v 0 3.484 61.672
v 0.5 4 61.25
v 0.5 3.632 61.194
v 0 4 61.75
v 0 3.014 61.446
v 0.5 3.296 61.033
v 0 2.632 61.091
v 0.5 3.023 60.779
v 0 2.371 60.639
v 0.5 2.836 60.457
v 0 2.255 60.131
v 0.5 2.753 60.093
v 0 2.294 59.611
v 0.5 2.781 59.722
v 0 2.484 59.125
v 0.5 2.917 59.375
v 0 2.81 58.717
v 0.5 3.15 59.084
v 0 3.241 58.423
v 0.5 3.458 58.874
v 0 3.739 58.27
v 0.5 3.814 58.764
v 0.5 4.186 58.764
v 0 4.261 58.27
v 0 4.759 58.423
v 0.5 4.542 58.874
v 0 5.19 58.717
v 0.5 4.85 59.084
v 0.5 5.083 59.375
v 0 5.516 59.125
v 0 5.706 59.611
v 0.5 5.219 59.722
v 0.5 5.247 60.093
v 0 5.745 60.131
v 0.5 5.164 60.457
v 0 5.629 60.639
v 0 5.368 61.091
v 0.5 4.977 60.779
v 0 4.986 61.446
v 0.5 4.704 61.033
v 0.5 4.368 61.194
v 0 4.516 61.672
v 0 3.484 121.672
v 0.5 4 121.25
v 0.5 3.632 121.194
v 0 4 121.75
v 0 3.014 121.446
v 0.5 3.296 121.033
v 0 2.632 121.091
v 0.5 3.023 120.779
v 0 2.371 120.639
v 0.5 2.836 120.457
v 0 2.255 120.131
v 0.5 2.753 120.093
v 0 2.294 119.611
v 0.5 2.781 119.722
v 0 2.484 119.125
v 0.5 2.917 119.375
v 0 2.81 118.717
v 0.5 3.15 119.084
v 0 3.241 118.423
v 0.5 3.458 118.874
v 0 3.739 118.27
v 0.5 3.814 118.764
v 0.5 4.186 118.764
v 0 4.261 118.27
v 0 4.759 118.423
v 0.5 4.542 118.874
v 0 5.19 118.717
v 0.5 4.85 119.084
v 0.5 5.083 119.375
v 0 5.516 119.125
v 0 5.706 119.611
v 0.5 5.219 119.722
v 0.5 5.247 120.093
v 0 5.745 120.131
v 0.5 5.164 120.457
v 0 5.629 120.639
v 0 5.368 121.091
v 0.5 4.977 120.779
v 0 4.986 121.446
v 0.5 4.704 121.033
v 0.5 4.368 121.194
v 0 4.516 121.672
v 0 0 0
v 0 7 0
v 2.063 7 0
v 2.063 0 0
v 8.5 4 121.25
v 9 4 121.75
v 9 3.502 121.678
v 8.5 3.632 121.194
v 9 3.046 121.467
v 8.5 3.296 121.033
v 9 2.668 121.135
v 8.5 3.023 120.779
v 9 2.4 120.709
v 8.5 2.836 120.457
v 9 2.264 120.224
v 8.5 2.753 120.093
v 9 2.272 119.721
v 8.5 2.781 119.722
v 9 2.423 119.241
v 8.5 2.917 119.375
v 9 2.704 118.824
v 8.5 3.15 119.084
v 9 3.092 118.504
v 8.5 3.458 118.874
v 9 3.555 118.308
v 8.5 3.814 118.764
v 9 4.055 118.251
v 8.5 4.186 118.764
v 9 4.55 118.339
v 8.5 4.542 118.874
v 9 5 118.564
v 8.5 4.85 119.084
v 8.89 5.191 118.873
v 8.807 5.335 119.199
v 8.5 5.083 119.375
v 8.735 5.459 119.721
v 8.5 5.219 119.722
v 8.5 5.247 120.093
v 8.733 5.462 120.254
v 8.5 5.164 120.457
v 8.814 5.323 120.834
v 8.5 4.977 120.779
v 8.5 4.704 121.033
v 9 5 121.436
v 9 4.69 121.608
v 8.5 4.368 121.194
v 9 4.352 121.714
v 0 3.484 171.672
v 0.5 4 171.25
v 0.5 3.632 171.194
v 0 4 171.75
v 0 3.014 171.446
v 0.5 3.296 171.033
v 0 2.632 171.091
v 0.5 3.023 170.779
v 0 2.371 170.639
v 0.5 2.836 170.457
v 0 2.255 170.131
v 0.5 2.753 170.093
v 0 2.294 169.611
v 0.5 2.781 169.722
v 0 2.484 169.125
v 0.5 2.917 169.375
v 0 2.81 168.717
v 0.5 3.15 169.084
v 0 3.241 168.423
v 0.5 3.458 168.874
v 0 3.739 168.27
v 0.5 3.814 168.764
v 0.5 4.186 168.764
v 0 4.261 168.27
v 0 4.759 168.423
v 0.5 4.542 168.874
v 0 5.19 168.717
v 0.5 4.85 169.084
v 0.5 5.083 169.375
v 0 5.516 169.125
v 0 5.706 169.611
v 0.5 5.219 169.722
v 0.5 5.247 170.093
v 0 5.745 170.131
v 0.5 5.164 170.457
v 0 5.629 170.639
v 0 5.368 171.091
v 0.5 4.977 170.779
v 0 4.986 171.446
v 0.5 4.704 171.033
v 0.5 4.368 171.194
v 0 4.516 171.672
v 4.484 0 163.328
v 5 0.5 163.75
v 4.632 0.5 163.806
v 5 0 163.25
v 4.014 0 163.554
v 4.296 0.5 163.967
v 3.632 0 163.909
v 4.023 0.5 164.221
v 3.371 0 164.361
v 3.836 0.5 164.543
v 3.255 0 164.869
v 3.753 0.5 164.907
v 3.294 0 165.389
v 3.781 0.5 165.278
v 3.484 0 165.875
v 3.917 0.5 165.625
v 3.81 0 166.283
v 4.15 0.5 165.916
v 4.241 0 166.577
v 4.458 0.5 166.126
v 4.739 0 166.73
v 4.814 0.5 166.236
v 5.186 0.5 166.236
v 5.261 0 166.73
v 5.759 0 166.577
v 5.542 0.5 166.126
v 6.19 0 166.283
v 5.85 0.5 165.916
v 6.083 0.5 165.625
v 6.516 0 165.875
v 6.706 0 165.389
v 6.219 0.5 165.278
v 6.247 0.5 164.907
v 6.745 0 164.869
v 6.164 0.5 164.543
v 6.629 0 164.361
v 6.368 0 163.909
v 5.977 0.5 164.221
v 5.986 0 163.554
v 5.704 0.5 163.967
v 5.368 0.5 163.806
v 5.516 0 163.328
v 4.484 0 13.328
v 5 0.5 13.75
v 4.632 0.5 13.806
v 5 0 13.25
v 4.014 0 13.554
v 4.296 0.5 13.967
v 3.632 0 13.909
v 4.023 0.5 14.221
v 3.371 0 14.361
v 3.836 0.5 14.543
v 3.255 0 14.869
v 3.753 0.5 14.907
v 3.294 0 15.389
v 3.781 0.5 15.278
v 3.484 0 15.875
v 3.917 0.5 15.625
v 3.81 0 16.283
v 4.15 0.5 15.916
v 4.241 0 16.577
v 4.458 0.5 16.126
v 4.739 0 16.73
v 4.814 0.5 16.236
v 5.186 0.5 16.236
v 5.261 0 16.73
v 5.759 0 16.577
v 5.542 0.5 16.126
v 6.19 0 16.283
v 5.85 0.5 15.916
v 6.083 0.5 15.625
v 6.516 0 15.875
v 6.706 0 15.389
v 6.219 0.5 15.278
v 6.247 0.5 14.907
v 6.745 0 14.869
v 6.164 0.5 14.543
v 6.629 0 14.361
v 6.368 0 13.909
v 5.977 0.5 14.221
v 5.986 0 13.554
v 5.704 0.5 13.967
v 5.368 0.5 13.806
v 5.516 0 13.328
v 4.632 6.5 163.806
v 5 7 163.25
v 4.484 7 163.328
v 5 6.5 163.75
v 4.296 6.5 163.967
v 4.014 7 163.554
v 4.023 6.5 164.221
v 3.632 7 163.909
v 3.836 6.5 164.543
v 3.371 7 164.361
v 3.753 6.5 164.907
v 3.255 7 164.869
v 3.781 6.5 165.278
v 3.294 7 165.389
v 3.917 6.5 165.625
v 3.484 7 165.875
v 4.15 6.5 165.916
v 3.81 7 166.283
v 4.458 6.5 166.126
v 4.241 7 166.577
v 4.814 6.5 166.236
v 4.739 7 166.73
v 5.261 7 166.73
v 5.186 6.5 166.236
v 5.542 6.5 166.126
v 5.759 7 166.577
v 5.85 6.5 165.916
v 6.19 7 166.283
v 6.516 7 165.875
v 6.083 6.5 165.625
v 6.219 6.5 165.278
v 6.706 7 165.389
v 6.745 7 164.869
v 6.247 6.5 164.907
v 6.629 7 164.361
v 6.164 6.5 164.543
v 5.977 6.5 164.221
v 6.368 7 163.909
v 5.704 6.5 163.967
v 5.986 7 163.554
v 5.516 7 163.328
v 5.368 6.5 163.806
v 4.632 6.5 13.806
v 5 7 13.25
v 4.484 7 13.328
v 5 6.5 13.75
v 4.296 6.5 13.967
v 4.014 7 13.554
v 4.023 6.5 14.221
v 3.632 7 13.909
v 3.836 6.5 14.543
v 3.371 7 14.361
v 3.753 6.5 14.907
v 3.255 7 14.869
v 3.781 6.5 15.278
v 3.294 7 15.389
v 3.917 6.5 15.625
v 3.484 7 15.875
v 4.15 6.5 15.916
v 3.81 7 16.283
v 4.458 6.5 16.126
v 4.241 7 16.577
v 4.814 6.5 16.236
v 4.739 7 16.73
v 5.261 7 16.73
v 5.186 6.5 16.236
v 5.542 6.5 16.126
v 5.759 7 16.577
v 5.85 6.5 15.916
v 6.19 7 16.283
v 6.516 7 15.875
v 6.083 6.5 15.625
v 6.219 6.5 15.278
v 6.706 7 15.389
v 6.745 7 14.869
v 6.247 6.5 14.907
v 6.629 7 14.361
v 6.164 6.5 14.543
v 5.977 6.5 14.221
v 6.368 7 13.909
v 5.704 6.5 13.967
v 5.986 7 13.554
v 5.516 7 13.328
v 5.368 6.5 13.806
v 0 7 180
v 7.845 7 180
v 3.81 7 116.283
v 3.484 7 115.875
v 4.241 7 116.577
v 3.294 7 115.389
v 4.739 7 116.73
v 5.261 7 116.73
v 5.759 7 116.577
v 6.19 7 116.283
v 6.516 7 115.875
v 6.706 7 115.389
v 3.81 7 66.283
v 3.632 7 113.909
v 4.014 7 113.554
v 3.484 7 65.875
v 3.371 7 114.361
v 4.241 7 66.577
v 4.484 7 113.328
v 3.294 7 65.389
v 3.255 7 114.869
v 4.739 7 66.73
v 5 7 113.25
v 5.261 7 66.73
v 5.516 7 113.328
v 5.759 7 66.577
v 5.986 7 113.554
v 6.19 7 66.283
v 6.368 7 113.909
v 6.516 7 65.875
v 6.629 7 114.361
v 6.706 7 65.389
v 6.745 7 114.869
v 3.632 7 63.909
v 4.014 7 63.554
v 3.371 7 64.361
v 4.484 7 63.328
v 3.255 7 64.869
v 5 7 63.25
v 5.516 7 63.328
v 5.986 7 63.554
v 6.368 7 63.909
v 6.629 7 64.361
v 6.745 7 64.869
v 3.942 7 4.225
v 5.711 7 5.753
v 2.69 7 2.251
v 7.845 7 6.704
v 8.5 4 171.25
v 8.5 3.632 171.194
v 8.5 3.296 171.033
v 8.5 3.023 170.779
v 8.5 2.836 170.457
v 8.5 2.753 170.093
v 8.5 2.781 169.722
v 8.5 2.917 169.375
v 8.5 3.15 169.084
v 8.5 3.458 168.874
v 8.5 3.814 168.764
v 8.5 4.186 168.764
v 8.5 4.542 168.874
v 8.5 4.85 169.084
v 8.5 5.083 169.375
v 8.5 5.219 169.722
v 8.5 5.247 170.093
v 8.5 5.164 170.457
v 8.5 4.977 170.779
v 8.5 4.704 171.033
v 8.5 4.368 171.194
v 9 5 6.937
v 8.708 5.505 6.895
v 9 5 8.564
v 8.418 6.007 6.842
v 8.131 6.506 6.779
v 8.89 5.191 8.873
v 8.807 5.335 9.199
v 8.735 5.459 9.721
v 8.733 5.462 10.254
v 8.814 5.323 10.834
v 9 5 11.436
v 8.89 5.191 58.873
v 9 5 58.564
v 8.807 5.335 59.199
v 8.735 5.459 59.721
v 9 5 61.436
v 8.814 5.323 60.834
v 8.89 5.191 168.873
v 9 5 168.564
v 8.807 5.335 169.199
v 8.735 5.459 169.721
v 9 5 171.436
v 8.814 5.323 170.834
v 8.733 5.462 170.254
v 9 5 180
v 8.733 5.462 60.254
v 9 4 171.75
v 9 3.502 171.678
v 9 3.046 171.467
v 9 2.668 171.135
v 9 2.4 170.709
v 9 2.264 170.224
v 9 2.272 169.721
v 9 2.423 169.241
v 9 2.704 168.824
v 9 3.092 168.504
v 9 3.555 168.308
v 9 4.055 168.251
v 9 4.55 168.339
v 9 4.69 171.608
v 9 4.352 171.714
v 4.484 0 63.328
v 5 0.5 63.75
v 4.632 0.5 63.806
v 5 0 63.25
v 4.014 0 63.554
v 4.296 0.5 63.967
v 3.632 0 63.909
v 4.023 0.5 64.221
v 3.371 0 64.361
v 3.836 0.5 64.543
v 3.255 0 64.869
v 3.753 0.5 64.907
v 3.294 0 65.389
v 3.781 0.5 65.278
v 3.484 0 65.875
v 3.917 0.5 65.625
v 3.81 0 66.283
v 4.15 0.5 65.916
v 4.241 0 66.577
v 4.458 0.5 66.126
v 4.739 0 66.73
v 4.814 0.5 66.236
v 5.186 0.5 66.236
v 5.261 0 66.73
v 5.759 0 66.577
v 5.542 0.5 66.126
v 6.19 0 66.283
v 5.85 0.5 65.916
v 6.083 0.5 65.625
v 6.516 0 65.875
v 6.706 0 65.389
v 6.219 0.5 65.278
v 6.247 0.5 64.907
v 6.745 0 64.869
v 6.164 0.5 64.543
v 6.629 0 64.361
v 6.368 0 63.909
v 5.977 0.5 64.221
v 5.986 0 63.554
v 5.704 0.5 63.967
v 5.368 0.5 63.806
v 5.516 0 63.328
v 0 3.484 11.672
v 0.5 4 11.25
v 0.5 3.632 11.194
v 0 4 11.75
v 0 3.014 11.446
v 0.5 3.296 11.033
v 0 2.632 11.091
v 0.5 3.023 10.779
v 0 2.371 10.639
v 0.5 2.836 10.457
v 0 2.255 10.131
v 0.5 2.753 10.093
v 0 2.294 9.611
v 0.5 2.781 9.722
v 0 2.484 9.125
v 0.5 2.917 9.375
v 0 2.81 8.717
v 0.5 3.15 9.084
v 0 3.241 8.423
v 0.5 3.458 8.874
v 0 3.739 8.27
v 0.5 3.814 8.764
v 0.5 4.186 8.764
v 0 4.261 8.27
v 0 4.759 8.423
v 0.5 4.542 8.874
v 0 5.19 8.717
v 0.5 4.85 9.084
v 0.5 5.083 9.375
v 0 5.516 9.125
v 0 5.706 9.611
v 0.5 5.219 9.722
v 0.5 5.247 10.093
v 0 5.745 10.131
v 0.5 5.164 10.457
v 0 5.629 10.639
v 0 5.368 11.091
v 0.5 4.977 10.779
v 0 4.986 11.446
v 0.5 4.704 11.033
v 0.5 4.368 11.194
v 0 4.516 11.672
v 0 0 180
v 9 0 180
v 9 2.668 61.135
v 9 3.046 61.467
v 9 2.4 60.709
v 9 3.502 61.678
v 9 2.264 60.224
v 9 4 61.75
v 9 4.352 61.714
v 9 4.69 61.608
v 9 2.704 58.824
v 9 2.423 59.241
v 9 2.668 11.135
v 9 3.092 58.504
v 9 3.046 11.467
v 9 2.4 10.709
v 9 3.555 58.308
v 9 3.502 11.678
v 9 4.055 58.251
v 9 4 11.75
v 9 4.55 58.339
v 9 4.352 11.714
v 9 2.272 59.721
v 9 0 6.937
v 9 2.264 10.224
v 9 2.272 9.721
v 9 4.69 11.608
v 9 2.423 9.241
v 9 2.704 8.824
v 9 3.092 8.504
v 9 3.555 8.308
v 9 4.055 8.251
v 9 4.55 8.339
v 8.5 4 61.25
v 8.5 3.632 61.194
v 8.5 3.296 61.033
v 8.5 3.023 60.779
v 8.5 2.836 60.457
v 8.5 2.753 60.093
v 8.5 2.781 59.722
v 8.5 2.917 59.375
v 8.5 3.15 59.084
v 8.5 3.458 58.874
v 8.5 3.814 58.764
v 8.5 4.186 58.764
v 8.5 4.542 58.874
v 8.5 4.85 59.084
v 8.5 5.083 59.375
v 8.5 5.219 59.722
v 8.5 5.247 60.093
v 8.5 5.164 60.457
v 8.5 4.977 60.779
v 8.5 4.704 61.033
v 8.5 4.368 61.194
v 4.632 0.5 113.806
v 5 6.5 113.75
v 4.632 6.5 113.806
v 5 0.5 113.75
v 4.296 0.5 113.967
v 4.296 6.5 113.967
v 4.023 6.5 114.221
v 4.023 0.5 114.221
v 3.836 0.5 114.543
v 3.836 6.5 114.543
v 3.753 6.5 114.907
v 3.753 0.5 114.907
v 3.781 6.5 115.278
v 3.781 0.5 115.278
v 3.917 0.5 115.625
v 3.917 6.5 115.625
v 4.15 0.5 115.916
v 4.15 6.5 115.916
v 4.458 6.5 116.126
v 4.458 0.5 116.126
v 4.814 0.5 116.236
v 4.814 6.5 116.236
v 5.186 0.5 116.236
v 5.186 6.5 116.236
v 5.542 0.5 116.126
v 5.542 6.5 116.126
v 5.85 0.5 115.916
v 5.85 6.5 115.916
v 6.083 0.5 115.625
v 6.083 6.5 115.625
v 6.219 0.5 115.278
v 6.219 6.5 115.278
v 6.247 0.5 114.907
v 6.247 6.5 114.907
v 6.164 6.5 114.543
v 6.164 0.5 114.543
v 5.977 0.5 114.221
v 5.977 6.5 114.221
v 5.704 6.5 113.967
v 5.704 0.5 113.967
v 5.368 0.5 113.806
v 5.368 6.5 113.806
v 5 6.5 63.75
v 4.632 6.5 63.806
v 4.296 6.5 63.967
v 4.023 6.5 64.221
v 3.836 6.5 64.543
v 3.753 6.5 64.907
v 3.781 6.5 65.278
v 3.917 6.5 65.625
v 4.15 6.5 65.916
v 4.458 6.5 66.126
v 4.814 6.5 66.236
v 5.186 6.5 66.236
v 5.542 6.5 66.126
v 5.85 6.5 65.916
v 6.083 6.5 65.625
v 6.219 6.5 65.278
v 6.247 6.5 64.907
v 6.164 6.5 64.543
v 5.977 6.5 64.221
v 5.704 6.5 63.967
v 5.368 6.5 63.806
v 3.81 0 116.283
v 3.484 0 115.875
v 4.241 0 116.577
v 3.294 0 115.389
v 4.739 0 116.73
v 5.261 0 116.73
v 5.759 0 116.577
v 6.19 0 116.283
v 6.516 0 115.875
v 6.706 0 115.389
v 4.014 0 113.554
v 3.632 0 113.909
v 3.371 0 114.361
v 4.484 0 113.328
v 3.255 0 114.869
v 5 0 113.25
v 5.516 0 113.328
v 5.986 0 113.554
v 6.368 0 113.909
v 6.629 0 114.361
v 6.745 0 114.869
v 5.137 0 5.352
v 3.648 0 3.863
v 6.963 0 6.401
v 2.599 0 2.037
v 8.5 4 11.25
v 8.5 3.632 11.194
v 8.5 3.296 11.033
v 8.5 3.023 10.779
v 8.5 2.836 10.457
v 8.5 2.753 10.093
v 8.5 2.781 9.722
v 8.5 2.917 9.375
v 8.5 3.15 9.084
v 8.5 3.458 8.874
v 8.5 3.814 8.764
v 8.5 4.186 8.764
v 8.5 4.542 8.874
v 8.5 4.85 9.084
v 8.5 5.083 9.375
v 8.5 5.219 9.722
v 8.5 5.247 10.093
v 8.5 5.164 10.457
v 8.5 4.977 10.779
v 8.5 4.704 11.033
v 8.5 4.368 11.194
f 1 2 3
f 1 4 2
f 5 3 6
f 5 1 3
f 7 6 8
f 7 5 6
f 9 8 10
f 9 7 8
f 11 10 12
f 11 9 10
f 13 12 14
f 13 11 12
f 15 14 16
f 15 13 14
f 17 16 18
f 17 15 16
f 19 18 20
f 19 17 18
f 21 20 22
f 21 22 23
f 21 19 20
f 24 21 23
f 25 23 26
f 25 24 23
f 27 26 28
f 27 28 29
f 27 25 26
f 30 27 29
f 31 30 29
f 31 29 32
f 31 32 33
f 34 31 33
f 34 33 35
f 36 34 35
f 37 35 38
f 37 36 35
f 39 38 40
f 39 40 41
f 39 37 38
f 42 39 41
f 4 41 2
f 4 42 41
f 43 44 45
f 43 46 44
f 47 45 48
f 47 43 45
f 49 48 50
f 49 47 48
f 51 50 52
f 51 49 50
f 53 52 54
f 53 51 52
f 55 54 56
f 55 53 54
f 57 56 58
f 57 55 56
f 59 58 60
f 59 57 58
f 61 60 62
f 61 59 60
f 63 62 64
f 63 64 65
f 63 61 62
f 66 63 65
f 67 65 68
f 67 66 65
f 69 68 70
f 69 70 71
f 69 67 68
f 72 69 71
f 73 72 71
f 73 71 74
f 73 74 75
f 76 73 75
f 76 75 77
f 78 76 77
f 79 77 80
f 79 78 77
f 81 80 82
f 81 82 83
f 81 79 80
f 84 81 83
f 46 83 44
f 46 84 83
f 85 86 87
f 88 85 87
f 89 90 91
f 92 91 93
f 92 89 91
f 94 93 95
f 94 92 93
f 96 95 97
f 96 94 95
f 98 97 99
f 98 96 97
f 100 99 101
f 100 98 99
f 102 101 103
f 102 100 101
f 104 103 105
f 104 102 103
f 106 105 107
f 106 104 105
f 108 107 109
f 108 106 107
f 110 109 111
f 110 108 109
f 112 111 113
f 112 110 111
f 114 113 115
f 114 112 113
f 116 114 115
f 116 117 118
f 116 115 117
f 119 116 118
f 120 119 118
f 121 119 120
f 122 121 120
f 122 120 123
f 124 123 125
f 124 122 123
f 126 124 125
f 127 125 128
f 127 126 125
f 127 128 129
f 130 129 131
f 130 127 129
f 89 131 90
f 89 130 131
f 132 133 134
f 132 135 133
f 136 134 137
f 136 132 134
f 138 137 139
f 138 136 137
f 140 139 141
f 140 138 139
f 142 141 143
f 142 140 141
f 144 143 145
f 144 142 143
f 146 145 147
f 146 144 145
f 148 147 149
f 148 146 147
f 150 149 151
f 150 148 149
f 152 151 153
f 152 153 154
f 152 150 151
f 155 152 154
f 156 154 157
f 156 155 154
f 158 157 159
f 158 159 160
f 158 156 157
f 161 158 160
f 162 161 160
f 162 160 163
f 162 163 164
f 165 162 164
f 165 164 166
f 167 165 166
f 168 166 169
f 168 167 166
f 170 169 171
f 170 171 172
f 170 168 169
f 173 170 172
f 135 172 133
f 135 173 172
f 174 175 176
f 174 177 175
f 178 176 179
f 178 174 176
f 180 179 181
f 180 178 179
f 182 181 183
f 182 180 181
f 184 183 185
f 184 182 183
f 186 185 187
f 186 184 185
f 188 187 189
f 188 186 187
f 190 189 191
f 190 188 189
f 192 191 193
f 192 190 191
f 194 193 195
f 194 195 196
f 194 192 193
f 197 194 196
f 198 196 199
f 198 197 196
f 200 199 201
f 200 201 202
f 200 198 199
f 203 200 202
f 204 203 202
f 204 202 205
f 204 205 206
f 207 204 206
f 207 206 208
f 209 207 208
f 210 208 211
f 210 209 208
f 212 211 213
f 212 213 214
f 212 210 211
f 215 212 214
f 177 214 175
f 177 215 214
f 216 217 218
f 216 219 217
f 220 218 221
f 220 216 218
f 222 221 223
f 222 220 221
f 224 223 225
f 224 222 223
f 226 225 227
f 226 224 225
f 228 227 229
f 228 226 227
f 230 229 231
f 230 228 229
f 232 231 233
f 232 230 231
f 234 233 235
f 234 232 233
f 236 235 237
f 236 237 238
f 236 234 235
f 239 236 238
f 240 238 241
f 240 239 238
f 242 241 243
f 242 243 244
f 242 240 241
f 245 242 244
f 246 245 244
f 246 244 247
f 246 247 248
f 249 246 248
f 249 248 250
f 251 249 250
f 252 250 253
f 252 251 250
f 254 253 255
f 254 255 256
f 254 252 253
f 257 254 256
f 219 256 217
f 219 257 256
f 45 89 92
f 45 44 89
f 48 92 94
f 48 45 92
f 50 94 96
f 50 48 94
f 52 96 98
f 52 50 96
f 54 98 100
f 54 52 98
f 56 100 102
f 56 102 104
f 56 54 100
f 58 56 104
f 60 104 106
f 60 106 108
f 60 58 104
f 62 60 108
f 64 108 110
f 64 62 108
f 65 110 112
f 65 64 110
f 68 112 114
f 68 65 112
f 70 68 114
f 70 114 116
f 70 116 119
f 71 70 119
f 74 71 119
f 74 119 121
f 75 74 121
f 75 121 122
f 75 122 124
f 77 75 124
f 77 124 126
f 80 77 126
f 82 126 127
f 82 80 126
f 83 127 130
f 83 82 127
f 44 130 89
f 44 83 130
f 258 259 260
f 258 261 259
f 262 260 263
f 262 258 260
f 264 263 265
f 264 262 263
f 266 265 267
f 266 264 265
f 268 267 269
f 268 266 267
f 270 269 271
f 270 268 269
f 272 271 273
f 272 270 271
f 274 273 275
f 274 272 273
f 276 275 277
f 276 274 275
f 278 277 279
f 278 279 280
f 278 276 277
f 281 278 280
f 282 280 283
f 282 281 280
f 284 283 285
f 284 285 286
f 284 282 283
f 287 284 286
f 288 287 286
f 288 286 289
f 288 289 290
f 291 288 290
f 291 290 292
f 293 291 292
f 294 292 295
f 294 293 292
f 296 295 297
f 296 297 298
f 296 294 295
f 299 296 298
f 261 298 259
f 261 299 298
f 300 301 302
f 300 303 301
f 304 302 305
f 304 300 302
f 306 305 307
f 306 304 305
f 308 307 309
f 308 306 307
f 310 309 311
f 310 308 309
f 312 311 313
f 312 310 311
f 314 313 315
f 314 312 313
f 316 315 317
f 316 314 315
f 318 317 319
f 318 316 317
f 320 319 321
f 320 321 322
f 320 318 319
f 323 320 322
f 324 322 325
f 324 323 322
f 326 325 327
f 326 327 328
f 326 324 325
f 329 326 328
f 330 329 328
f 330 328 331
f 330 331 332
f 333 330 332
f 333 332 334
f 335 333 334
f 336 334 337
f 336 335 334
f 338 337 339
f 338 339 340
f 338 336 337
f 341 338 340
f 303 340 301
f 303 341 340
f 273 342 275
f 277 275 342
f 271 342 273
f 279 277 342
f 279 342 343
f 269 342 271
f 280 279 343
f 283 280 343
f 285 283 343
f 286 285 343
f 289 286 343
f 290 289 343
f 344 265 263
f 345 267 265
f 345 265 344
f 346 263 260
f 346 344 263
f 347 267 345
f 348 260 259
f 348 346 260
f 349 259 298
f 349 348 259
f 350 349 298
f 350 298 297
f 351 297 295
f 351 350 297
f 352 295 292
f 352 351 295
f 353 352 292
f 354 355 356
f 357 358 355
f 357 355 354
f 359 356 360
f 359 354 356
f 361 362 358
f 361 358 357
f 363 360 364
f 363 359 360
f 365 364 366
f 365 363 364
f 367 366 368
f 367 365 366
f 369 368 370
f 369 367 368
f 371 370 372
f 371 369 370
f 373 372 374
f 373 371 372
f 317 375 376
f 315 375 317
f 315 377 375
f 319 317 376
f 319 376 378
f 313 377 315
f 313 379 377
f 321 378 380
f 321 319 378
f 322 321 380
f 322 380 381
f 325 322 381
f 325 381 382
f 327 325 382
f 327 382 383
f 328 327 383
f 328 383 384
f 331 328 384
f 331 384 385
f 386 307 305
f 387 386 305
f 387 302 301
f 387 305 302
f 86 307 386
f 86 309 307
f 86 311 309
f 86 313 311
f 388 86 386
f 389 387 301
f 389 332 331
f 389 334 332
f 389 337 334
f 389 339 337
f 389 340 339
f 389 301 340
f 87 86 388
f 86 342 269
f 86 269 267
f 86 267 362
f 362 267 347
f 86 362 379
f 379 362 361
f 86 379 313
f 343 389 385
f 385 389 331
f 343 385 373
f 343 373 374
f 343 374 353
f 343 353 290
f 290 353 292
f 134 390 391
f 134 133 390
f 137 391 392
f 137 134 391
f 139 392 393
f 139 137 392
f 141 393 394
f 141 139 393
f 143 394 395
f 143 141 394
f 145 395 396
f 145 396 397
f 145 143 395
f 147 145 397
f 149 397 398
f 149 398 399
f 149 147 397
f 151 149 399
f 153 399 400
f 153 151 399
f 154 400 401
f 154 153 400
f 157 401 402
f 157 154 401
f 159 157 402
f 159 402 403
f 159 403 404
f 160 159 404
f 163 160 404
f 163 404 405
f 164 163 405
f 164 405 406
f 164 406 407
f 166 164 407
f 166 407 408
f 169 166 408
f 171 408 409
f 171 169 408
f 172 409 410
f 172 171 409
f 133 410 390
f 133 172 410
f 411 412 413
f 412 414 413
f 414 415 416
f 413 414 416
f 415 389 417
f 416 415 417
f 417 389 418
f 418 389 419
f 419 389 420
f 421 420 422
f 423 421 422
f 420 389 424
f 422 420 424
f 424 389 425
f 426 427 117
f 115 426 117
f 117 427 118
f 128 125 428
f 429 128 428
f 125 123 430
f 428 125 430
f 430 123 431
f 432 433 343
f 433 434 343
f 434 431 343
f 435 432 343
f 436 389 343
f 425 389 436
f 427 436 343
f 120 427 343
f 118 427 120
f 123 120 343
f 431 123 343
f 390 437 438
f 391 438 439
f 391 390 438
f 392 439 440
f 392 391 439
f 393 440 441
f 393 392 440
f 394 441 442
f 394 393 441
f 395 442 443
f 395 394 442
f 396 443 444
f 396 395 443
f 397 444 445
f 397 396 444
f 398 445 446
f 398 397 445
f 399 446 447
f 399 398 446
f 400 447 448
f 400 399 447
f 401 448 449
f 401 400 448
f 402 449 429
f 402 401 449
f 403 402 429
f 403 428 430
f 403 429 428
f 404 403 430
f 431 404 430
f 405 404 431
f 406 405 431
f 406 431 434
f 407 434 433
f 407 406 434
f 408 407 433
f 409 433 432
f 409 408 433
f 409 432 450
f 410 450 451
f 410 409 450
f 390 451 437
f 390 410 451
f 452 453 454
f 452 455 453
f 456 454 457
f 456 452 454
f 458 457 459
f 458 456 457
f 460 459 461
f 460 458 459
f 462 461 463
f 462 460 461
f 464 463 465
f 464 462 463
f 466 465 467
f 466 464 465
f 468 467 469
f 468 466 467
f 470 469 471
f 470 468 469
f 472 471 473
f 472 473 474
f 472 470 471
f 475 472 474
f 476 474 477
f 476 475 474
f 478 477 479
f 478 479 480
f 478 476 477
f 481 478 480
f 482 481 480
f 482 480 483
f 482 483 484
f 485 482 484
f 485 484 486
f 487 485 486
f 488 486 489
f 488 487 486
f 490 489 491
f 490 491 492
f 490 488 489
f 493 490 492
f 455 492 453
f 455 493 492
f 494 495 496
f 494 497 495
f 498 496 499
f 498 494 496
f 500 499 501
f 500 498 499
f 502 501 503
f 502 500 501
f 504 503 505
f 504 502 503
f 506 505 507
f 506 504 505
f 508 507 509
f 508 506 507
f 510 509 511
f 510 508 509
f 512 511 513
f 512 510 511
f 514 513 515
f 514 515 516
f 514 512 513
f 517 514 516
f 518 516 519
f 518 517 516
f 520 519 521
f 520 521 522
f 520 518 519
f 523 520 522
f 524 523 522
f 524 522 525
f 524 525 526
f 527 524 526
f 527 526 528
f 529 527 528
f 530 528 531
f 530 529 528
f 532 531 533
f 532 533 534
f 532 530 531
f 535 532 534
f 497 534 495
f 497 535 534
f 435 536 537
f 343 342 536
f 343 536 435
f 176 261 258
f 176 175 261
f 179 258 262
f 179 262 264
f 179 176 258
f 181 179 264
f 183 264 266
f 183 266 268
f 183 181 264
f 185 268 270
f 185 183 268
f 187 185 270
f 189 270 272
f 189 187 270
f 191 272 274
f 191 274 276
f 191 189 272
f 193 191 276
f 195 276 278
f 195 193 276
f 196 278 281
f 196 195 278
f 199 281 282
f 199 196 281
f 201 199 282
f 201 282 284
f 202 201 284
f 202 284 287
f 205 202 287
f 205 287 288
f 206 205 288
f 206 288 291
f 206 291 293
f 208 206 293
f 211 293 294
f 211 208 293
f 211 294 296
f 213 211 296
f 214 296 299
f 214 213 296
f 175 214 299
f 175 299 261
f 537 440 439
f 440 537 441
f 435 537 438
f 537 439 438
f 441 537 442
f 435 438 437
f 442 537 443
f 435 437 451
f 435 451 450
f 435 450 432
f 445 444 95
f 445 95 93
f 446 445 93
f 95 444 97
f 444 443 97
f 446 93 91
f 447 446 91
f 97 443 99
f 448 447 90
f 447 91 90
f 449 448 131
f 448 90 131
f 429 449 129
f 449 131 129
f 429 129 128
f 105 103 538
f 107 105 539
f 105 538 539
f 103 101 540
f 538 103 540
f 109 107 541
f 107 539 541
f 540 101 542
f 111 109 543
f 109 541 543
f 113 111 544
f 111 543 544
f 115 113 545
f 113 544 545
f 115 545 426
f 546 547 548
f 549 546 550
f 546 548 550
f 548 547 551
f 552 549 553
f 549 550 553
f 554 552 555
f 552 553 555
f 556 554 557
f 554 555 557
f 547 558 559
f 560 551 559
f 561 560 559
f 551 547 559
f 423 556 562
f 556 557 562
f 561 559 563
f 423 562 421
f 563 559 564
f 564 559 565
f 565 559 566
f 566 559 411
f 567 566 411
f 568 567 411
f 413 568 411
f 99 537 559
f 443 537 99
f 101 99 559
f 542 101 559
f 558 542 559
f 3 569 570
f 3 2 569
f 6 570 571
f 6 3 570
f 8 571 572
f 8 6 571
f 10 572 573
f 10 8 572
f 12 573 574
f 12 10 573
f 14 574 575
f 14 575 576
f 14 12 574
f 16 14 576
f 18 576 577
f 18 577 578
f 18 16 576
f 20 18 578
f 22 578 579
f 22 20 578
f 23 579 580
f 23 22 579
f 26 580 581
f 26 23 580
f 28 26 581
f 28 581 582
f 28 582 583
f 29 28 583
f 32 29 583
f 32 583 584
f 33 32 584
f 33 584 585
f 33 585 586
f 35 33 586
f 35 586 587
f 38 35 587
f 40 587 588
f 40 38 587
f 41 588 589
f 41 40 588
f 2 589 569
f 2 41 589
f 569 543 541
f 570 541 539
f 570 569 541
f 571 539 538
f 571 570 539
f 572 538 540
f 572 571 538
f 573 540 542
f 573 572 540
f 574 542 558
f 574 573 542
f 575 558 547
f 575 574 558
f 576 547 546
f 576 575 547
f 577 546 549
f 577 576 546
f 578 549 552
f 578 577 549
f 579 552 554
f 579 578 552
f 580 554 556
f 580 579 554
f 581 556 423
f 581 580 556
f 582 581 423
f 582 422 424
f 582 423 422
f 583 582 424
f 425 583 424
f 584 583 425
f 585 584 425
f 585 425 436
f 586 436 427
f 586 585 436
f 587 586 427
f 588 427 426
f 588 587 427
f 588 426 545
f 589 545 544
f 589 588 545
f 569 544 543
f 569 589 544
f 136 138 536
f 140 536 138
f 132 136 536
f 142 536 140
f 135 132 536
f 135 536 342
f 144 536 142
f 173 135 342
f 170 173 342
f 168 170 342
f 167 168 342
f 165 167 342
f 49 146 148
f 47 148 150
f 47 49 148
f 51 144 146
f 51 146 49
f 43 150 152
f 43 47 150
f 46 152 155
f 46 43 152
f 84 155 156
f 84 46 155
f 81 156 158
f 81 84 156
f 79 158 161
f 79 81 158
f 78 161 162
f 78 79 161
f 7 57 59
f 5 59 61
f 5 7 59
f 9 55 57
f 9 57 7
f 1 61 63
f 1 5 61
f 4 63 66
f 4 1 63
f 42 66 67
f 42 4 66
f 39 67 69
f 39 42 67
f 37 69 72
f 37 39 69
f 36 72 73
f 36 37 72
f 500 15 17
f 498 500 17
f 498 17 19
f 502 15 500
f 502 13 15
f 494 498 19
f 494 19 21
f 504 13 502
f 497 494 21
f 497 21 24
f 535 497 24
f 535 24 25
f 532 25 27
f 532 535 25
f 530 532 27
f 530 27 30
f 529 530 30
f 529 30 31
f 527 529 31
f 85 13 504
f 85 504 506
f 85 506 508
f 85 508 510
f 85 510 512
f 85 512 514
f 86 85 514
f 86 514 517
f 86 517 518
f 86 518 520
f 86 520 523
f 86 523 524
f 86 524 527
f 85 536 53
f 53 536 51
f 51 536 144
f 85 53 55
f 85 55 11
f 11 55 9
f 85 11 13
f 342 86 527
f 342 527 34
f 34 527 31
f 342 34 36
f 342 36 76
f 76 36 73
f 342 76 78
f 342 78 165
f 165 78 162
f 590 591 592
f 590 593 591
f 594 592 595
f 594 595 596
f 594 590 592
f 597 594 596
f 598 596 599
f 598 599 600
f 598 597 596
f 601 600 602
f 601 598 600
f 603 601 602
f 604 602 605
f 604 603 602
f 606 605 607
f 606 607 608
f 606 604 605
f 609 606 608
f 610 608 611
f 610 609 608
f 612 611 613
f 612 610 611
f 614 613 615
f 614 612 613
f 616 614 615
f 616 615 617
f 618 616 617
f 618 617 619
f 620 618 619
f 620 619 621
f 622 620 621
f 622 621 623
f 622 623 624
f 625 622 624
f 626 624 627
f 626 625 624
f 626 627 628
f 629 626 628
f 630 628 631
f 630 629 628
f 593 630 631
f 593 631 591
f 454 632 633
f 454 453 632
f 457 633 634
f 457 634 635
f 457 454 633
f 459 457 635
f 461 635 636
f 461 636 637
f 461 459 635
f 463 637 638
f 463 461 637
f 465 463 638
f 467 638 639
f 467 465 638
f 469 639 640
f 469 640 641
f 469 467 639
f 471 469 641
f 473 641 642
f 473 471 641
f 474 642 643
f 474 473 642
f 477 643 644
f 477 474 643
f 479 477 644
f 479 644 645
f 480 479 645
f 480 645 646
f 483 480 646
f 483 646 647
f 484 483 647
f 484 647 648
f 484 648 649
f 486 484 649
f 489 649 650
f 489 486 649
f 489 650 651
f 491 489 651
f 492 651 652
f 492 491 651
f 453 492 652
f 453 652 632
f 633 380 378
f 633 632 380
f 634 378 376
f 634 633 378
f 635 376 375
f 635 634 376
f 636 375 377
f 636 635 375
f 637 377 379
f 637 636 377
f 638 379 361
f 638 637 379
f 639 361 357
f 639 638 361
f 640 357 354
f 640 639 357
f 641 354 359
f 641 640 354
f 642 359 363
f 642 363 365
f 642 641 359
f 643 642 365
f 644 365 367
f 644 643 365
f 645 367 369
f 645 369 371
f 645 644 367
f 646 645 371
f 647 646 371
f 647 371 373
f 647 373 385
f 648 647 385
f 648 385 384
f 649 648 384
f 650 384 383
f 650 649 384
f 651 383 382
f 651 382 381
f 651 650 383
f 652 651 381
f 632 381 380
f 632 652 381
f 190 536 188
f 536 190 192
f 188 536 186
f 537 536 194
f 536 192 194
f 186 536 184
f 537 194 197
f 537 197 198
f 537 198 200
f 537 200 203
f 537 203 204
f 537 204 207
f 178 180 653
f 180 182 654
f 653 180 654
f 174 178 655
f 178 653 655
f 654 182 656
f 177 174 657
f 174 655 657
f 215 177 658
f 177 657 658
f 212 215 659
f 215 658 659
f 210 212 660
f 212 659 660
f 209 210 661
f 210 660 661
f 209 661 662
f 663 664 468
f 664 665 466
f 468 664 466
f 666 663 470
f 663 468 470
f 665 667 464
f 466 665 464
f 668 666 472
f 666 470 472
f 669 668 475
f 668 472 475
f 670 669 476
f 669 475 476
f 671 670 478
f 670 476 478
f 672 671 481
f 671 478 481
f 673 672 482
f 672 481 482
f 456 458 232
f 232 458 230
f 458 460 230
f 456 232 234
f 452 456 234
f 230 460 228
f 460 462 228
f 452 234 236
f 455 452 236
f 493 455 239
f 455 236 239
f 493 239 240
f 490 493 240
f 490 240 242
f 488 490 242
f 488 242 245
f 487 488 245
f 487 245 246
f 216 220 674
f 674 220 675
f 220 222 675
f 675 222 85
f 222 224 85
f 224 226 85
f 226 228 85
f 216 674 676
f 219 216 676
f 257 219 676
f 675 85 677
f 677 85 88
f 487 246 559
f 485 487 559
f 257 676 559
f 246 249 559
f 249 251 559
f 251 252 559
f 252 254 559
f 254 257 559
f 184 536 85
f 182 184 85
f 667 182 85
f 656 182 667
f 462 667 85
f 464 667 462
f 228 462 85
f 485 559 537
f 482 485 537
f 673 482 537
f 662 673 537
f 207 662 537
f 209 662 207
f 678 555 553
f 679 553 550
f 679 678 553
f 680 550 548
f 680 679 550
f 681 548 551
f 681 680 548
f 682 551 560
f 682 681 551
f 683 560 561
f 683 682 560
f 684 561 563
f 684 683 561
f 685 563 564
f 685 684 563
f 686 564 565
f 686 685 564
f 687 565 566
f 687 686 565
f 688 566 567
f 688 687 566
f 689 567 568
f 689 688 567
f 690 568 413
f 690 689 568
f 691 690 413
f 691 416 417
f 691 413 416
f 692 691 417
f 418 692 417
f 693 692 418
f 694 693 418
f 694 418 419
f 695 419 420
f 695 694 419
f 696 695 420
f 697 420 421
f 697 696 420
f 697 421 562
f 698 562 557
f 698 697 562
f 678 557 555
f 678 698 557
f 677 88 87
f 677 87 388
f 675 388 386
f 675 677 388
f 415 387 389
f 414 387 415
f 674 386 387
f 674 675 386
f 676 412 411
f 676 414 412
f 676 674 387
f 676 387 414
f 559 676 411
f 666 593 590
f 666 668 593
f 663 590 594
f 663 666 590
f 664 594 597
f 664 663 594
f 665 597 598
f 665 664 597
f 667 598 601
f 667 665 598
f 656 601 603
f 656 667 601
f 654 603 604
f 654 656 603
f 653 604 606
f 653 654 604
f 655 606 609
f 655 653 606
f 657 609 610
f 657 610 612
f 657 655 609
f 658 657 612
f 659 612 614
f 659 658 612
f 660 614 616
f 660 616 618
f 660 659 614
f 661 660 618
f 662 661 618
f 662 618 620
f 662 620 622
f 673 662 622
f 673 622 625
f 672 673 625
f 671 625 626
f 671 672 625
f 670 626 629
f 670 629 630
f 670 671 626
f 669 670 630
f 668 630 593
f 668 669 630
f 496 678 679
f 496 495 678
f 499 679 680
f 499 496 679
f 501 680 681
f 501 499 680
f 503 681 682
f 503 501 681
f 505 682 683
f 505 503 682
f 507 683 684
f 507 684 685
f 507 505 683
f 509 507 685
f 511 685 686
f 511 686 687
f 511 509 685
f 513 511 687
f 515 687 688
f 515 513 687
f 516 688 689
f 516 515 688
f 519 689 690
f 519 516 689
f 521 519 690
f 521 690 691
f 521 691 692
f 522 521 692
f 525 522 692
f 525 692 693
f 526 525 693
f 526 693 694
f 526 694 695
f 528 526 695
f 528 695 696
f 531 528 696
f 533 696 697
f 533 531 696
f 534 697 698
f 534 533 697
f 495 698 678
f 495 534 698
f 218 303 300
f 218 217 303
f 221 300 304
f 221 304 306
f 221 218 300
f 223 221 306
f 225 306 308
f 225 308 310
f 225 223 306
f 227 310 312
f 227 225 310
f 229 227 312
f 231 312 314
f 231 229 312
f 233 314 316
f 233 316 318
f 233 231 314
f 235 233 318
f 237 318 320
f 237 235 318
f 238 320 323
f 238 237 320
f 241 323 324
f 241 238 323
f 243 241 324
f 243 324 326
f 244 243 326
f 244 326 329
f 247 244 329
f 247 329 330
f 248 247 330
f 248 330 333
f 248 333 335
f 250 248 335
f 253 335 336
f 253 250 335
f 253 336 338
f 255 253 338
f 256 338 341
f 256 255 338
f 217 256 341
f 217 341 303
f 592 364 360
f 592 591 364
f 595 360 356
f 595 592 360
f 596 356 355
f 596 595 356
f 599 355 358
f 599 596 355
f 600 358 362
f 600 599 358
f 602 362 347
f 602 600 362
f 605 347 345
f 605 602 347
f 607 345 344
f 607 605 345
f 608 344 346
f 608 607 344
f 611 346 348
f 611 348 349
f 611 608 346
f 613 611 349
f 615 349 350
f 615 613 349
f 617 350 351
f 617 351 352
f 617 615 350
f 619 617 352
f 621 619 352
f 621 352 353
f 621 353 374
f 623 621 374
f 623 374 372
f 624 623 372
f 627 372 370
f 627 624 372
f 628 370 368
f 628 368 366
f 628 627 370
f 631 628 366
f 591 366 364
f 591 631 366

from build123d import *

# Parameters (mm, degrees)
SKETCH_1_W                 = 9
SKETCH_1_H                 = 7
EXTRUDE_1_DEPTH            = 180
CUT_EXTRUDE_1_DEPTH        = 1
CUT_EXTRUDE_1_DEPTH_BACK   = 8
CHAMFER_1_SIZE             = 2
CHAMFER_1_SIZE2            = 1.154700538
HOLE_WIZARD_M31_AT_2_COUNT = 2
HOLE_WIZARD_M31_AT_2_PITCH = 50
HOLE_WIZARD_M31_AT_3_COUNT = 2
HOLE_WIZARD_M31_AT_3_PITCH = 100
HOLE_WIZARD_M31_AT_4_COUNT = 2
HOLE_WIZARD_M31_AT_4_PITCH = 150
HOLE_WIZARD_M32_AT_2_COUNT = 2
HOLE_WIZARD_M32_AT_2_PITCH = 50
HOLE_WIZARD_M32_AT_3_COUNT = 2
HOLE_WIZARD_M32_AT_3_PITCH = 110
HOLE_WIZARD_M32_AT_4_COUNT = 2
HOLE_WIZARD_M32_AT_4_PITCH = 160


with BuildPart() as part:
    # Эскиз1 → Бобышка-Вытянуть1 (new body)
    with BuildSketch(Plane.XY):
        with Locations((4.5, 3.5)):
            Rectangle(SKETCH_1_W, SKETCH_1_H)
    extrude(amount=EXTRUDE_1_DEPTH)

    # Эскиз6 → Вырез-Вытянуть1 (cut, two sides)
    with BuildSketch(Plane.XZ) as cut_extrude_1_sk:
        with BuildLine():
            Line((-44.220662013, -367.363162821), (2.062746067, 0))
            ThreePointArc((2.062746067, 0), (4.343145751, 4.656854249), (9, 6.937253933))
            Line((9, 6.937253933), (376.363162821, 53.220662013))
            Line((376.363162821, 53.220662013), (900.000150172, -470.416325339))
            Line((900.000150172, -470.416325339), (479.416325339, -891.000150172))
            Line((479.416325339, -891.000150172), (-44.220662013, -367.363162821))
        make_face()
    extrude(amount=CUT_EXTRUDE_1_DEPTH, mode=Mode.SUBTRACT)
    extrude(cut_extrude_1_sk.sketch, amount=-CUT_EXTRUDE_1_DEPTH_BACK, mode=Mode.SUBTRACT)

    # Фаска1
    chamfer_1_edges = [part.edges().sort_by_distance(p)[0] for p in [
        (9, 7, 93.468626967),
    ]]
    chamfer_1_side = [part.faces().sort_by_distance(p)[0] for p in [
        (9, 3.5, 93.468626967),
    ]]
    chamfer(chamfer_1_edges, length=CHAMFER_1_SIZE, length2=CHAMFER_1_SIZE2, reference=chamfer_1_side[0])

    # Эскиз2 → Отверстие обработанное метчиком M31 (revolve, cut)
    with BuildSketch(Plane(origin=(5, 0, 15), x_dir=(0, 0, -1), z_dir=(1, 0, 0))):
        Polygon((0, 0), (0, 7), (1.75, 7), (1.25, 6.5), (1.25, 0.5), (1.75, 0), align=None)
    hole_wizard_m31 = revolve(axis=Axis((5, -6.35, 15), (0, 1, 0)), mode=Mode.SUBTRACT)

    # Отверстие обработанное метчиком M31 at 2: Отверстие обработанное метчиком M31 ×2
    with Locations(*[(0, 0, i * HOLE_WIZARD_M31_AT_2_PITCH) for i in range(1, HOLE_WIZARD_M31_AT_2_COUNT)]):
        add(hole_wizard_m31, mode=Mode.SUBTRACT)

    # Отверстие обработанное метчиком M31 at 3: Отверстие обработанное метчиком M31 ×2
    with Locations(*[(0, 0, i * HOLE_WIZARD_M31_AT_3_PITCH) for i in range(1, HOLE_WIZARD_M31_AT_3_COUNT)]):
        add(hole_wizard_m31, mode=Mode.SUBTRACT)

    # Отверстие обработанное метчиком M31 at 4: Отверстие обработанное метчиком M31 ×2
    with Locations(*[(0, 0, i * HOLE_WIZARD_M31_AT_4_PITCH) for i in range(1, HOLE_WIZARD_M31_AT_4_COUNT)]):
        add(hole_wizard_m31, mode=Mode.SUBTRACT)

    # Эскиз4 → Отверстие обработанное метчиком M32 (revolve, cut)
    with BuildSketch(Plane(origin=(0, 4, 10), x_dir=(0, 0, 1), z_dir=(0, 1, 0))):
        Polygon((0, 0), (0, 9), (1.75, 9), (1.25, 8.5), (1.25, 0.5), (1.75, 0), align=None)
    hole_wizard_m32 = revolve(axis=Axis((-6.35, 4, 10), (1, 0, 0)), mode=Mode.SUBTRACT)

    # Отверстие обработанное метчиком M32 at 2: Отверстие обработанное метчиком M32 ×2
    with Locations(*[(0, 0, i * HOLE_WIZARD_M32_AT_2_PITCH) for i in range(1, HOLE_WIZARD_M32_AT_2_COUNT)]):
        add(hole_wizard_m32, mode=Mode.SUBTRACT)

    # Отверстие обработанное метчиком M32 at 3: Отверстие обработанное метчиком M32 ×2
    with Locations(*[(0, 0, i * HOLE_WIZARD_M32_AT_3_PITCH) for i in range(1, HOLE_WIZARD_M32_AT_3_COUNT)]):
        add(hole_wizard_m32, mode=Mode.SUBTRACT)

    # Отверстие обработанное метчиком M32 at 4: Отверстие обработанное метчиком M32 ×2
    with Locations(*[(0, 0, i * HOLE_WIZARD_M32_AT_4_PITCH) for i in range(1, HOLE_WIZARD_M32_AT_4_COUNT)]):
        add(hole_wizard_m32, mode=Mode.SUBTRACT)


solid = part.part
